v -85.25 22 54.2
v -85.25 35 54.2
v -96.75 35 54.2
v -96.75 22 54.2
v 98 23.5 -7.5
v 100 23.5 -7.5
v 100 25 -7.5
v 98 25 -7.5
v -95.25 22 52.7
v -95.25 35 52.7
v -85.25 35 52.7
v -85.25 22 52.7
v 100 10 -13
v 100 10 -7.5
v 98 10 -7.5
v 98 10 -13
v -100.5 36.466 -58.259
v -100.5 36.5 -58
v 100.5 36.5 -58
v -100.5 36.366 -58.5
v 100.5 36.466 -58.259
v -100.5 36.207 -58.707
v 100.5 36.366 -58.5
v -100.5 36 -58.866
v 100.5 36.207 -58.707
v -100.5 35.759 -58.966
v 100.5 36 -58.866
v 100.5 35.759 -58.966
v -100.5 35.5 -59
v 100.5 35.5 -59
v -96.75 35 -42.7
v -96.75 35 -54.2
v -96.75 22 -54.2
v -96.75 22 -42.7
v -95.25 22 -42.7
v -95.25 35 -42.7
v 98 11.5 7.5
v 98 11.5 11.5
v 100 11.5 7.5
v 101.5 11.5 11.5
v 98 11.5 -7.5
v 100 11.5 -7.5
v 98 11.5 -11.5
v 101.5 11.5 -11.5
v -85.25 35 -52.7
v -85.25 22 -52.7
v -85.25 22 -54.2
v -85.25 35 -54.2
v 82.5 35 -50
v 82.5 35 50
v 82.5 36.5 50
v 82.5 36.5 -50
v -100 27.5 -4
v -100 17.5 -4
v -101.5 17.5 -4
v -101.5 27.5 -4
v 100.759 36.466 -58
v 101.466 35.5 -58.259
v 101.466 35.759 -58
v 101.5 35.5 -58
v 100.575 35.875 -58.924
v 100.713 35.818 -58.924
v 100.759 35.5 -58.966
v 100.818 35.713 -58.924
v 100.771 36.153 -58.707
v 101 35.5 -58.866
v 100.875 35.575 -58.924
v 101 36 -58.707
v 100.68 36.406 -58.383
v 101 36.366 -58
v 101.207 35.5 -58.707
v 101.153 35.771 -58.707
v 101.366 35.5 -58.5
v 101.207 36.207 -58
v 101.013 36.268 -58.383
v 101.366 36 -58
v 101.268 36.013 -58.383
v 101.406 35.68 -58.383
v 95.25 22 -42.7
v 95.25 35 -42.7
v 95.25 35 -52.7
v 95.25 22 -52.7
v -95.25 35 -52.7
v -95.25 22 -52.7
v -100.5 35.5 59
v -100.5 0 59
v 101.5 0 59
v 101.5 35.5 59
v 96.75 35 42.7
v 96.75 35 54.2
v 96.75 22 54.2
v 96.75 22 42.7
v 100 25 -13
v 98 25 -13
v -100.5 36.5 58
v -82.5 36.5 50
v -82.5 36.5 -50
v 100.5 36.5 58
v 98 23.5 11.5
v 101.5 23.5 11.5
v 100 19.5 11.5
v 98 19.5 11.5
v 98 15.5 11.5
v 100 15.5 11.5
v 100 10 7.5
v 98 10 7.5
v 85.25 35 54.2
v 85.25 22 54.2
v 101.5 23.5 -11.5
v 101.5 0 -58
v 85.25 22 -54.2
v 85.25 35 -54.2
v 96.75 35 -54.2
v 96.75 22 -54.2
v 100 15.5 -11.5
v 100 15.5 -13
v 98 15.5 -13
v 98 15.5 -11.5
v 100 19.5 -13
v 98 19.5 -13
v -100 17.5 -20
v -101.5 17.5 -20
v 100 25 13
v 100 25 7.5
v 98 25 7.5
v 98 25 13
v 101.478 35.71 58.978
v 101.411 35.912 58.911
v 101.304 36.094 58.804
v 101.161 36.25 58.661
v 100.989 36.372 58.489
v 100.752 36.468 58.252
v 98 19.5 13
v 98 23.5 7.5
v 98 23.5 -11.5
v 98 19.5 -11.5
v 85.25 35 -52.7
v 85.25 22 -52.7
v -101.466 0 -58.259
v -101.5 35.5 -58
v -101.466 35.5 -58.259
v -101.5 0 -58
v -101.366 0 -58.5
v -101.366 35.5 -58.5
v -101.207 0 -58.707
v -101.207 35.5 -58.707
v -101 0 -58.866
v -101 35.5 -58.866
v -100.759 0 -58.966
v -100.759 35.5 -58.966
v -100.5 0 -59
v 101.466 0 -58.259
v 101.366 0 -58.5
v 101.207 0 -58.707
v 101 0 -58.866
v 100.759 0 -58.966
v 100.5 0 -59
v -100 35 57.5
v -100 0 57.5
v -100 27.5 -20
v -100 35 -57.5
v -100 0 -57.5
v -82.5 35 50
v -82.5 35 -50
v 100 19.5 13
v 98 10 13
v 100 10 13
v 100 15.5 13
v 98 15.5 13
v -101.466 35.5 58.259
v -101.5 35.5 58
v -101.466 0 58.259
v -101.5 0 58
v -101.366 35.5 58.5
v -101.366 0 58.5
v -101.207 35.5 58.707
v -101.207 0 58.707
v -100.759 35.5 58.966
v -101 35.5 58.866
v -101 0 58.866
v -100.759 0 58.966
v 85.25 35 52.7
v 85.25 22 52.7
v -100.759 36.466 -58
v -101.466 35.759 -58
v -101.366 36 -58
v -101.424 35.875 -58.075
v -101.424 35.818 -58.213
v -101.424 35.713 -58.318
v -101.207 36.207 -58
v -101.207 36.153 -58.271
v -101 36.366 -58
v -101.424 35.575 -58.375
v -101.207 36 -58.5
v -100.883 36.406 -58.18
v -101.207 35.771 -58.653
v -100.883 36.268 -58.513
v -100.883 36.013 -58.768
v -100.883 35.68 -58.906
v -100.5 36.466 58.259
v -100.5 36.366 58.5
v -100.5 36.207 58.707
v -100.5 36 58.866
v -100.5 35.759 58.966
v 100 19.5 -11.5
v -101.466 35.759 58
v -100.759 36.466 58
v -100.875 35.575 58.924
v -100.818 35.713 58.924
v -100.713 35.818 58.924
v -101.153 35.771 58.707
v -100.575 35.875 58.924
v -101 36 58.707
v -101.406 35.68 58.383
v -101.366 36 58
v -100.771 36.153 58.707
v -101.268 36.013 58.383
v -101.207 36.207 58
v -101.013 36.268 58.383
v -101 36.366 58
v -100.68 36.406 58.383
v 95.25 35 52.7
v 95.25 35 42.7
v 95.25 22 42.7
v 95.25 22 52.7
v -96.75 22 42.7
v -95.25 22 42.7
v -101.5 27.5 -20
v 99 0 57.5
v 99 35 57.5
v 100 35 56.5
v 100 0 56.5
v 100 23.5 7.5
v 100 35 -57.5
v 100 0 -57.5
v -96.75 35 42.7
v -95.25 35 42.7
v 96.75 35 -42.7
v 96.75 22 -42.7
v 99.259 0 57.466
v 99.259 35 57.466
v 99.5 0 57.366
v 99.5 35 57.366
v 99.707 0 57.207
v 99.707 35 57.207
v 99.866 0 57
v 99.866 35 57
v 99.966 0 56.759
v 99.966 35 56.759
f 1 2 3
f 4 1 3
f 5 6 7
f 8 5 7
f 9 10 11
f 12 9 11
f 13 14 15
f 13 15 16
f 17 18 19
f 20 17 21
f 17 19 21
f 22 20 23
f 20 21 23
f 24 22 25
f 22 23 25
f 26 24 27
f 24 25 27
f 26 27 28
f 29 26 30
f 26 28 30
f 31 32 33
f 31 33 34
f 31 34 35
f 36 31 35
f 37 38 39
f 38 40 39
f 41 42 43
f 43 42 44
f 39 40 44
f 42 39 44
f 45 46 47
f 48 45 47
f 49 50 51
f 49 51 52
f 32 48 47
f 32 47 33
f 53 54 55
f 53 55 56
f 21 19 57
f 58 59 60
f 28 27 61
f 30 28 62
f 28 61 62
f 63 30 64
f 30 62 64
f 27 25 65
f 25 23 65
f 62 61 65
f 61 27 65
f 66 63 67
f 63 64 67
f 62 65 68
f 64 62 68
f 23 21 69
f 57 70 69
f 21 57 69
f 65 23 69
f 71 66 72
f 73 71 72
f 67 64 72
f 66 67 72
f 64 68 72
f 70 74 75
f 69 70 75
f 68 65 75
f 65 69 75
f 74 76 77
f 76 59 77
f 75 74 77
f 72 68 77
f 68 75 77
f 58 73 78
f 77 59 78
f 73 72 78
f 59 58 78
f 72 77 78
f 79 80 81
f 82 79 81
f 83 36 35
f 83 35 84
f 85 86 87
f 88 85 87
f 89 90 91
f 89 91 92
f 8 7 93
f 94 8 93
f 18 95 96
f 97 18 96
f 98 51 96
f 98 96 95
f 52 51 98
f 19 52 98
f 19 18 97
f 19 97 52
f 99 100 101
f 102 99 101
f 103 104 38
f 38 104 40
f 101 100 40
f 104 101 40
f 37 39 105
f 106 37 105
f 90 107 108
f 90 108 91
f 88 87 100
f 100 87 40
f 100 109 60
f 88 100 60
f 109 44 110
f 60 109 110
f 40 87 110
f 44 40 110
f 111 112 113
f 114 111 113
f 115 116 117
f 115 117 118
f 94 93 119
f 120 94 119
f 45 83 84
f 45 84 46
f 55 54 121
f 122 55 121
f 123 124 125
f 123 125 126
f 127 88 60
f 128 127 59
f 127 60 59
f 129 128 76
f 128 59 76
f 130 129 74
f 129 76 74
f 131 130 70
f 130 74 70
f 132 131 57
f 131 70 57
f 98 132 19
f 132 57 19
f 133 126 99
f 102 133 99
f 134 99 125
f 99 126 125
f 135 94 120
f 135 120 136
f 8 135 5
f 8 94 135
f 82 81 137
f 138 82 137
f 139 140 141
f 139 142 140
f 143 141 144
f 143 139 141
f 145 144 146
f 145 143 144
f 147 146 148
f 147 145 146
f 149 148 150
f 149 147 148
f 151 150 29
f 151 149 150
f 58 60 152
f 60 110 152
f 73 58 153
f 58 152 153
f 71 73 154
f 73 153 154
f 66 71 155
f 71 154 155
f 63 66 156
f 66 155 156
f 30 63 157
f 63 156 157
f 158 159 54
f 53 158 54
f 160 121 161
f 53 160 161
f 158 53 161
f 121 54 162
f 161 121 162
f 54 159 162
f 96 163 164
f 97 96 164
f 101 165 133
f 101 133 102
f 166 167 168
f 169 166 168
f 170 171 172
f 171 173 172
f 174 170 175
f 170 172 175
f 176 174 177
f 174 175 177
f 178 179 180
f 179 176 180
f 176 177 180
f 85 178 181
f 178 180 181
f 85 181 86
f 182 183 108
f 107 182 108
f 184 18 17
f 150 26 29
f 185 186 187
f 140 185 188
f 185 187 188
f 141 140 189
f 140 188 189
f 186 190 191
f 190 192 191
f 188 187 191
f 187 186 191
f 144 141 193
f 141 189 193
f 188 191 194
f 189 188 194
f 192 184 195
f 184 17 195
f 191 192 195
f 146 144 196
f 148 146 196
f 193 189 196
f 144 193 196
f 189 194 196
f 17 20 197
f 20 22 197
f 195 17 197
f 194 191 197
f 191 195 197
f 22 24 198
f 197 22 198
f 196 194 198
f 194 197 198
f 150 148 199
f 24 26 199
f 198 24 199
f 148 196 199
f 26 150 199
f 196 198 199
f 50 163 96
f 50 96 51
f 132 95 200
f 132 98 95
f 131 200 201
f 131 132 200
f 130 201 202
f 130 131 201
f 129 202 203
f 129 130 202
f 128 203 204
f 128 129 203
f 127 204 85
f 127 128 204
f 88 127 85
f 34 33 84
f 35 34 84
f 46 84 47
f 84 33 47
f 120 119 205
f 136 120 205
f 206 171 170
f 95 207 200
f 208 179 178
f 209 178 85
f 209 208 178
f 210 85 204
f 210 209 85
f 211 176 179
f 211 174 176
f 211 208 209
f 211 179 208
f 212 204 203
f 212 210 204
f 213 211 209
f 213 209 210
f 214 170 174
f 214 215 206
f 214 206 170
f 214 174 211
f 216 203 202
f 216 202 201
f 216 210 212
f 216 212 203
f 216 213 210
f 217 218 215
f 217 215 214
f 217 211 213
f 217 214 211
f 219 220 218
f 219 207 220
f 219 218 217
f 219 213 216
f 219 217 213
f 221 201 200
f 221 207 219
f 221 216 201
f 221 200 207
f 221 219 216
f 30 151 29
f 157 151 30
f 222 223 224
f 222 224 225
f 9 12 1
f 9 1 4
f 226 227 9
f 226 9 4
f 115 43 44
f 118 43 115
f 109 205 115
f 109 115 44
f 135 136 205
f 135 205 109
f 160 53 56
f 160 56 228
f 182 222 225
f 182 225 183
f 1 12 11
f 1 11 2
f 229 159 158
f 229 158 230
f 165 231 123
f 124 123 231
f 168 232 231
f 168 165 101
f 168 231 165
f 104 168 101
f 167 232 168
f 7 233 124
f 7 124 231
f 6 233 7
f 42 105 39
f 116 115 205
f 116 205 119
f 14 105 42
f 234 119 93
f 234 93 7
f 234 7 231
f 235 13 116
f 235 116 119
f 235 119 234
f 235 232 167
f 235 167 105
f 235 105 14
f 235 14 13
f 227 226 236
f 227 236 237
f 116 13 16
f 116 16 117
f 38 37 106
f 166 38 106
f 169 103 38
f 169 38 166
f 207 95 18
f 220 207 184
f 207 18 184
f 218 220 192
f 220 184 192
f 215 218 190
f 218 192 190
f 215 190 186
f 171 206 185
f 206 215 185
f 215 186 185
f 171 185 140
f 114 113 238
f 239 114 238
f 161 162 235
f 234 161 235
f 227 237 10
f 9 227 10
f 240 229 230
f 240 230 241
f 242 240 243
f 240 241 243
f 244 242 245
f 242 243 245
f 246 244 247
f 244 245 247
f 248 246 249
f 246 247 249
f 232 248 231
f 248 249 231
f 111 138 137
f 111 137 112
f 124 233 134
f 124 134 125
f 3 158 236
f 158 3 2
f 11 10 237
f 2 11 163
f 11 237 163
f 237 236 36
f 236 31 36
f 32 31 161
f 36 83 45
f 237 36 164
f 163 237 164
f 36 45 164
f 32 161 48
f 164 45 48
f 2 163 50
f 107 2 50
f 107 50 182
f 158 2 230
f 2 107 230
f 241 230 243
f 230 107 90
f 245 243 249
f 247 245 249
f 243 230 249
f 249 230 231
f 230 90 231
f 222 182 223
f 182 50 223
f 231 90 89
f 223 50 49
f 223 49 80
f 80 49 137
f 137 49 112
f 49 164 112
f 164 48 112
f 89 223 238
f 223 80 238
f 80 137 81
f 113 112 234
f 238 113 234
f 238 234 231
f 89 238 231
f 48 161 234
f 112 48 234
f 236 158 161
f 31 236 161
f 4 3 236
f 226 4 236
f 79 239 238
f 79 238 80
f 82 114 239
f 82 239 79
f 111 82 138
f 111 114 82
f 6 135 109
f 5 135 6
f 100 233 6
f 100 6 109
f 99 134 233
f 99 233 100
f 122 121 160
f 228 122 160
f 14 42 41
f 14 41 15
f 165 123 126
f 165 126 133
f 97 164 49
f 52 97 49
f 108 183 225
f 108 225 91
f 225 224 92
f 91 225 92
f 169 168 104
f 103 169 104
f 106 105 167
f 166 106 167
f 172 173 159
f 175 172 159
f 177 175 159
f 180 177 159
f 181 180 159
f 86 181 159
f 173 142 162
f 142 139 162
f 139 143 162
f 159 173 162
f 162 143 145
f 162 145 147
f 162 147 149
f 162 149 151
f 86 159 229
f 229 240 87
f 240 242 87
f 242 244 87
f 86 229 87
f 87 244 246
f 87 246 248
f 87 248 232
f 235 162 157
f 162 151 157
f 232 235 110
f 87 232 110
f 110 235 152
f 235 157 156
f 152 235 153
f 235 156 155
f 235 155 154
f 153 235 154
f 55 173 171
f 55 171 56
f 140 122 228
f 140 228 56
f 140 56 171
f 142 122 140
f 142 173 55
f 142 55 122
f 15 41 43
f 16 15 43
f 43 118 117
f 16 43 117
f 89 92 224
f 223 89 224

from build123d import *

# Parameters (mm, degrees)
SKETCH_1_W          = 200
SKETCH_1_H          = 115
F_35MM_DEPTH        = 35
SHELL_3_T           = 1.5
SKETCH_2_W          = 165
SKETCH_2_H          = 100
CUT_EXTRUDE_7_DEPTH = 1.5
SKETCH_3_W          = 16
SKETCH_3_H          = 10
CUT_EXTRUDE_8_DEPTH = 1.5
SKETCH_4_W          = 23
SKETCH_4_H          = 12
CUT_EXTRUDE_9_DEPTH = 1.5
EXTRUDE_1_DEPTH     = 13
EXTRUDE_2_DEPTH     = 2
FILLET_2_R          = 1


with BuildPart() as part:
    # 草图1 → 凸台-拉伸35mm (new body)
    with BuildSketch(Plane(origin=(0, 0, 0), x_dir=(1, 0, 0), z_dir=(0, 1, 0))):
        Rectangle(SKETCH_1_W, SKETCH_1_H)
    extrude(amount=F_35MM_DEPTH)

    # 抽壳3
    shell_3_openings = [part.faces().sort_by_distance(p)[0] for p in [
        (0, 0, 0),
    ]]
    offset(amount=SHELL_3_T, openings=shell_3_openings, kind=Kind.INTERSECTION)

    # 草图2 → 切除-拉伸7 (cut)
    with BuildSketch(Plane(origin=(0, 35, 0), x_dir=(1, 0, 0), z_dir=(0, 1, 0))):
        Rectangle(SKETCH_2_W, SKETCH_2_H)
    extrude(amount=CUT_EXTRUDE_7_DEPTH, mode=Mode.SUBTRACT)

    # 草图3 → 切除-拉伸8 (cut)
    with BuildSketch(Plane(origin=(-100, 0, 0), x_dir=(0, 0, -1), z_dir=(1, 0, 0))):
        with Locations((12, 22.5)):
            Rectangle(SKETCH_3_W, SKETCH_3_H)
    extrude(amount=-CUT_EXTRUDE_8_DEPTH, mode=Mode.SUBTRACT)

    # 草图4 → 切除-拉伸9 (cut)
    with BuildSketch(Plane.ZY.offset(-100)):
        with Locations((0, 17.5)):
            Rectangle(SKETCH_4_W, SKETCH_4_H)
    extrude(amount=-CUT_EXTRUDE_9_DEPTH, mode=Mode.SUBTRACT)

    # 草图6 → 凸台-拉伸1 (add)
    with BuildSketch(Plane(origin=(0, 35, 0), x_dir=(-1, 0, 0), z_dir=(0, -1, 0))):
        Polygon((-95.25, 52.7), (-85.25, 52.7), (-85.25, 54.2), (-96.75, 54.2), (-96.75, 42.7), (-95.25, 42.7), align=None)
        Polygon((-96.75, -42.7), (-95.25, -42.7), (-95.25, -52.7), (-85.25, -52.7), (-85.25, -54.2), (-96.75, -54.2), align=None)
        Polygon((85.25, -52.7), (85.25, -54.2), (96.75, -54.2), (96.75, -42.7), (95.25, -42.7), (95.25, -52.7), align=None)
        Polygon((85.25, 52.7), (85.25, 54.2), (96.75, 54.2), (96.75, 42.7), (95.25, 42.7), (95.25, 52.7), align=None)
    extrude(amount=EXTRUDE_1_DEPTH)

    # 草图7 → 凸台-拉伸2 (add)
    with BuildSketch(Plane.ZY.offset(-100)):
        Polygon((13, 15.5), (11.5, 15.5), (11.5, 11.5), (7.5, 11.5), (7.5, 10), (13, 10), align=None)
        Polygon((-7.5, 23.5), (-7.5, 25), (-13, 25), (-13, 19.5), (-11.5, 19.5), (-11.5, 23.5), align=None)
        Polygon((7.5, 23.5), (7.5, 25), (13, 25), (13, 19.5), (11.5, 19.5), (11.5, 23.5), align=None)
        Polygon((-7.5, 11.5), (-7.5, 10), (-13, 10), (-13, 15.5), (-11.5, 15.5), (-11.5, 11.5), align=None)
    extrude(amount=EXTRUDE_2_DEPTH)

    # 圆角2
    fillet_2_edges = [part.edges().sort_by_distance(p)[0] for p in [
        (101.5, 36.5, 0),
        (0, 36.5, -59),
        (100, 17.5, 57.5),
        (-101.5, 36.5, 0),
        (-101.5, 18.25, -59),
        (101.5, 18.25, -59),
        (-101.5, 18.25, 59),
        (0, 36.5, 59),
    ]]
    fillet(fillet_2_edges, radius=FILLET_2_R)


solid = part.part
